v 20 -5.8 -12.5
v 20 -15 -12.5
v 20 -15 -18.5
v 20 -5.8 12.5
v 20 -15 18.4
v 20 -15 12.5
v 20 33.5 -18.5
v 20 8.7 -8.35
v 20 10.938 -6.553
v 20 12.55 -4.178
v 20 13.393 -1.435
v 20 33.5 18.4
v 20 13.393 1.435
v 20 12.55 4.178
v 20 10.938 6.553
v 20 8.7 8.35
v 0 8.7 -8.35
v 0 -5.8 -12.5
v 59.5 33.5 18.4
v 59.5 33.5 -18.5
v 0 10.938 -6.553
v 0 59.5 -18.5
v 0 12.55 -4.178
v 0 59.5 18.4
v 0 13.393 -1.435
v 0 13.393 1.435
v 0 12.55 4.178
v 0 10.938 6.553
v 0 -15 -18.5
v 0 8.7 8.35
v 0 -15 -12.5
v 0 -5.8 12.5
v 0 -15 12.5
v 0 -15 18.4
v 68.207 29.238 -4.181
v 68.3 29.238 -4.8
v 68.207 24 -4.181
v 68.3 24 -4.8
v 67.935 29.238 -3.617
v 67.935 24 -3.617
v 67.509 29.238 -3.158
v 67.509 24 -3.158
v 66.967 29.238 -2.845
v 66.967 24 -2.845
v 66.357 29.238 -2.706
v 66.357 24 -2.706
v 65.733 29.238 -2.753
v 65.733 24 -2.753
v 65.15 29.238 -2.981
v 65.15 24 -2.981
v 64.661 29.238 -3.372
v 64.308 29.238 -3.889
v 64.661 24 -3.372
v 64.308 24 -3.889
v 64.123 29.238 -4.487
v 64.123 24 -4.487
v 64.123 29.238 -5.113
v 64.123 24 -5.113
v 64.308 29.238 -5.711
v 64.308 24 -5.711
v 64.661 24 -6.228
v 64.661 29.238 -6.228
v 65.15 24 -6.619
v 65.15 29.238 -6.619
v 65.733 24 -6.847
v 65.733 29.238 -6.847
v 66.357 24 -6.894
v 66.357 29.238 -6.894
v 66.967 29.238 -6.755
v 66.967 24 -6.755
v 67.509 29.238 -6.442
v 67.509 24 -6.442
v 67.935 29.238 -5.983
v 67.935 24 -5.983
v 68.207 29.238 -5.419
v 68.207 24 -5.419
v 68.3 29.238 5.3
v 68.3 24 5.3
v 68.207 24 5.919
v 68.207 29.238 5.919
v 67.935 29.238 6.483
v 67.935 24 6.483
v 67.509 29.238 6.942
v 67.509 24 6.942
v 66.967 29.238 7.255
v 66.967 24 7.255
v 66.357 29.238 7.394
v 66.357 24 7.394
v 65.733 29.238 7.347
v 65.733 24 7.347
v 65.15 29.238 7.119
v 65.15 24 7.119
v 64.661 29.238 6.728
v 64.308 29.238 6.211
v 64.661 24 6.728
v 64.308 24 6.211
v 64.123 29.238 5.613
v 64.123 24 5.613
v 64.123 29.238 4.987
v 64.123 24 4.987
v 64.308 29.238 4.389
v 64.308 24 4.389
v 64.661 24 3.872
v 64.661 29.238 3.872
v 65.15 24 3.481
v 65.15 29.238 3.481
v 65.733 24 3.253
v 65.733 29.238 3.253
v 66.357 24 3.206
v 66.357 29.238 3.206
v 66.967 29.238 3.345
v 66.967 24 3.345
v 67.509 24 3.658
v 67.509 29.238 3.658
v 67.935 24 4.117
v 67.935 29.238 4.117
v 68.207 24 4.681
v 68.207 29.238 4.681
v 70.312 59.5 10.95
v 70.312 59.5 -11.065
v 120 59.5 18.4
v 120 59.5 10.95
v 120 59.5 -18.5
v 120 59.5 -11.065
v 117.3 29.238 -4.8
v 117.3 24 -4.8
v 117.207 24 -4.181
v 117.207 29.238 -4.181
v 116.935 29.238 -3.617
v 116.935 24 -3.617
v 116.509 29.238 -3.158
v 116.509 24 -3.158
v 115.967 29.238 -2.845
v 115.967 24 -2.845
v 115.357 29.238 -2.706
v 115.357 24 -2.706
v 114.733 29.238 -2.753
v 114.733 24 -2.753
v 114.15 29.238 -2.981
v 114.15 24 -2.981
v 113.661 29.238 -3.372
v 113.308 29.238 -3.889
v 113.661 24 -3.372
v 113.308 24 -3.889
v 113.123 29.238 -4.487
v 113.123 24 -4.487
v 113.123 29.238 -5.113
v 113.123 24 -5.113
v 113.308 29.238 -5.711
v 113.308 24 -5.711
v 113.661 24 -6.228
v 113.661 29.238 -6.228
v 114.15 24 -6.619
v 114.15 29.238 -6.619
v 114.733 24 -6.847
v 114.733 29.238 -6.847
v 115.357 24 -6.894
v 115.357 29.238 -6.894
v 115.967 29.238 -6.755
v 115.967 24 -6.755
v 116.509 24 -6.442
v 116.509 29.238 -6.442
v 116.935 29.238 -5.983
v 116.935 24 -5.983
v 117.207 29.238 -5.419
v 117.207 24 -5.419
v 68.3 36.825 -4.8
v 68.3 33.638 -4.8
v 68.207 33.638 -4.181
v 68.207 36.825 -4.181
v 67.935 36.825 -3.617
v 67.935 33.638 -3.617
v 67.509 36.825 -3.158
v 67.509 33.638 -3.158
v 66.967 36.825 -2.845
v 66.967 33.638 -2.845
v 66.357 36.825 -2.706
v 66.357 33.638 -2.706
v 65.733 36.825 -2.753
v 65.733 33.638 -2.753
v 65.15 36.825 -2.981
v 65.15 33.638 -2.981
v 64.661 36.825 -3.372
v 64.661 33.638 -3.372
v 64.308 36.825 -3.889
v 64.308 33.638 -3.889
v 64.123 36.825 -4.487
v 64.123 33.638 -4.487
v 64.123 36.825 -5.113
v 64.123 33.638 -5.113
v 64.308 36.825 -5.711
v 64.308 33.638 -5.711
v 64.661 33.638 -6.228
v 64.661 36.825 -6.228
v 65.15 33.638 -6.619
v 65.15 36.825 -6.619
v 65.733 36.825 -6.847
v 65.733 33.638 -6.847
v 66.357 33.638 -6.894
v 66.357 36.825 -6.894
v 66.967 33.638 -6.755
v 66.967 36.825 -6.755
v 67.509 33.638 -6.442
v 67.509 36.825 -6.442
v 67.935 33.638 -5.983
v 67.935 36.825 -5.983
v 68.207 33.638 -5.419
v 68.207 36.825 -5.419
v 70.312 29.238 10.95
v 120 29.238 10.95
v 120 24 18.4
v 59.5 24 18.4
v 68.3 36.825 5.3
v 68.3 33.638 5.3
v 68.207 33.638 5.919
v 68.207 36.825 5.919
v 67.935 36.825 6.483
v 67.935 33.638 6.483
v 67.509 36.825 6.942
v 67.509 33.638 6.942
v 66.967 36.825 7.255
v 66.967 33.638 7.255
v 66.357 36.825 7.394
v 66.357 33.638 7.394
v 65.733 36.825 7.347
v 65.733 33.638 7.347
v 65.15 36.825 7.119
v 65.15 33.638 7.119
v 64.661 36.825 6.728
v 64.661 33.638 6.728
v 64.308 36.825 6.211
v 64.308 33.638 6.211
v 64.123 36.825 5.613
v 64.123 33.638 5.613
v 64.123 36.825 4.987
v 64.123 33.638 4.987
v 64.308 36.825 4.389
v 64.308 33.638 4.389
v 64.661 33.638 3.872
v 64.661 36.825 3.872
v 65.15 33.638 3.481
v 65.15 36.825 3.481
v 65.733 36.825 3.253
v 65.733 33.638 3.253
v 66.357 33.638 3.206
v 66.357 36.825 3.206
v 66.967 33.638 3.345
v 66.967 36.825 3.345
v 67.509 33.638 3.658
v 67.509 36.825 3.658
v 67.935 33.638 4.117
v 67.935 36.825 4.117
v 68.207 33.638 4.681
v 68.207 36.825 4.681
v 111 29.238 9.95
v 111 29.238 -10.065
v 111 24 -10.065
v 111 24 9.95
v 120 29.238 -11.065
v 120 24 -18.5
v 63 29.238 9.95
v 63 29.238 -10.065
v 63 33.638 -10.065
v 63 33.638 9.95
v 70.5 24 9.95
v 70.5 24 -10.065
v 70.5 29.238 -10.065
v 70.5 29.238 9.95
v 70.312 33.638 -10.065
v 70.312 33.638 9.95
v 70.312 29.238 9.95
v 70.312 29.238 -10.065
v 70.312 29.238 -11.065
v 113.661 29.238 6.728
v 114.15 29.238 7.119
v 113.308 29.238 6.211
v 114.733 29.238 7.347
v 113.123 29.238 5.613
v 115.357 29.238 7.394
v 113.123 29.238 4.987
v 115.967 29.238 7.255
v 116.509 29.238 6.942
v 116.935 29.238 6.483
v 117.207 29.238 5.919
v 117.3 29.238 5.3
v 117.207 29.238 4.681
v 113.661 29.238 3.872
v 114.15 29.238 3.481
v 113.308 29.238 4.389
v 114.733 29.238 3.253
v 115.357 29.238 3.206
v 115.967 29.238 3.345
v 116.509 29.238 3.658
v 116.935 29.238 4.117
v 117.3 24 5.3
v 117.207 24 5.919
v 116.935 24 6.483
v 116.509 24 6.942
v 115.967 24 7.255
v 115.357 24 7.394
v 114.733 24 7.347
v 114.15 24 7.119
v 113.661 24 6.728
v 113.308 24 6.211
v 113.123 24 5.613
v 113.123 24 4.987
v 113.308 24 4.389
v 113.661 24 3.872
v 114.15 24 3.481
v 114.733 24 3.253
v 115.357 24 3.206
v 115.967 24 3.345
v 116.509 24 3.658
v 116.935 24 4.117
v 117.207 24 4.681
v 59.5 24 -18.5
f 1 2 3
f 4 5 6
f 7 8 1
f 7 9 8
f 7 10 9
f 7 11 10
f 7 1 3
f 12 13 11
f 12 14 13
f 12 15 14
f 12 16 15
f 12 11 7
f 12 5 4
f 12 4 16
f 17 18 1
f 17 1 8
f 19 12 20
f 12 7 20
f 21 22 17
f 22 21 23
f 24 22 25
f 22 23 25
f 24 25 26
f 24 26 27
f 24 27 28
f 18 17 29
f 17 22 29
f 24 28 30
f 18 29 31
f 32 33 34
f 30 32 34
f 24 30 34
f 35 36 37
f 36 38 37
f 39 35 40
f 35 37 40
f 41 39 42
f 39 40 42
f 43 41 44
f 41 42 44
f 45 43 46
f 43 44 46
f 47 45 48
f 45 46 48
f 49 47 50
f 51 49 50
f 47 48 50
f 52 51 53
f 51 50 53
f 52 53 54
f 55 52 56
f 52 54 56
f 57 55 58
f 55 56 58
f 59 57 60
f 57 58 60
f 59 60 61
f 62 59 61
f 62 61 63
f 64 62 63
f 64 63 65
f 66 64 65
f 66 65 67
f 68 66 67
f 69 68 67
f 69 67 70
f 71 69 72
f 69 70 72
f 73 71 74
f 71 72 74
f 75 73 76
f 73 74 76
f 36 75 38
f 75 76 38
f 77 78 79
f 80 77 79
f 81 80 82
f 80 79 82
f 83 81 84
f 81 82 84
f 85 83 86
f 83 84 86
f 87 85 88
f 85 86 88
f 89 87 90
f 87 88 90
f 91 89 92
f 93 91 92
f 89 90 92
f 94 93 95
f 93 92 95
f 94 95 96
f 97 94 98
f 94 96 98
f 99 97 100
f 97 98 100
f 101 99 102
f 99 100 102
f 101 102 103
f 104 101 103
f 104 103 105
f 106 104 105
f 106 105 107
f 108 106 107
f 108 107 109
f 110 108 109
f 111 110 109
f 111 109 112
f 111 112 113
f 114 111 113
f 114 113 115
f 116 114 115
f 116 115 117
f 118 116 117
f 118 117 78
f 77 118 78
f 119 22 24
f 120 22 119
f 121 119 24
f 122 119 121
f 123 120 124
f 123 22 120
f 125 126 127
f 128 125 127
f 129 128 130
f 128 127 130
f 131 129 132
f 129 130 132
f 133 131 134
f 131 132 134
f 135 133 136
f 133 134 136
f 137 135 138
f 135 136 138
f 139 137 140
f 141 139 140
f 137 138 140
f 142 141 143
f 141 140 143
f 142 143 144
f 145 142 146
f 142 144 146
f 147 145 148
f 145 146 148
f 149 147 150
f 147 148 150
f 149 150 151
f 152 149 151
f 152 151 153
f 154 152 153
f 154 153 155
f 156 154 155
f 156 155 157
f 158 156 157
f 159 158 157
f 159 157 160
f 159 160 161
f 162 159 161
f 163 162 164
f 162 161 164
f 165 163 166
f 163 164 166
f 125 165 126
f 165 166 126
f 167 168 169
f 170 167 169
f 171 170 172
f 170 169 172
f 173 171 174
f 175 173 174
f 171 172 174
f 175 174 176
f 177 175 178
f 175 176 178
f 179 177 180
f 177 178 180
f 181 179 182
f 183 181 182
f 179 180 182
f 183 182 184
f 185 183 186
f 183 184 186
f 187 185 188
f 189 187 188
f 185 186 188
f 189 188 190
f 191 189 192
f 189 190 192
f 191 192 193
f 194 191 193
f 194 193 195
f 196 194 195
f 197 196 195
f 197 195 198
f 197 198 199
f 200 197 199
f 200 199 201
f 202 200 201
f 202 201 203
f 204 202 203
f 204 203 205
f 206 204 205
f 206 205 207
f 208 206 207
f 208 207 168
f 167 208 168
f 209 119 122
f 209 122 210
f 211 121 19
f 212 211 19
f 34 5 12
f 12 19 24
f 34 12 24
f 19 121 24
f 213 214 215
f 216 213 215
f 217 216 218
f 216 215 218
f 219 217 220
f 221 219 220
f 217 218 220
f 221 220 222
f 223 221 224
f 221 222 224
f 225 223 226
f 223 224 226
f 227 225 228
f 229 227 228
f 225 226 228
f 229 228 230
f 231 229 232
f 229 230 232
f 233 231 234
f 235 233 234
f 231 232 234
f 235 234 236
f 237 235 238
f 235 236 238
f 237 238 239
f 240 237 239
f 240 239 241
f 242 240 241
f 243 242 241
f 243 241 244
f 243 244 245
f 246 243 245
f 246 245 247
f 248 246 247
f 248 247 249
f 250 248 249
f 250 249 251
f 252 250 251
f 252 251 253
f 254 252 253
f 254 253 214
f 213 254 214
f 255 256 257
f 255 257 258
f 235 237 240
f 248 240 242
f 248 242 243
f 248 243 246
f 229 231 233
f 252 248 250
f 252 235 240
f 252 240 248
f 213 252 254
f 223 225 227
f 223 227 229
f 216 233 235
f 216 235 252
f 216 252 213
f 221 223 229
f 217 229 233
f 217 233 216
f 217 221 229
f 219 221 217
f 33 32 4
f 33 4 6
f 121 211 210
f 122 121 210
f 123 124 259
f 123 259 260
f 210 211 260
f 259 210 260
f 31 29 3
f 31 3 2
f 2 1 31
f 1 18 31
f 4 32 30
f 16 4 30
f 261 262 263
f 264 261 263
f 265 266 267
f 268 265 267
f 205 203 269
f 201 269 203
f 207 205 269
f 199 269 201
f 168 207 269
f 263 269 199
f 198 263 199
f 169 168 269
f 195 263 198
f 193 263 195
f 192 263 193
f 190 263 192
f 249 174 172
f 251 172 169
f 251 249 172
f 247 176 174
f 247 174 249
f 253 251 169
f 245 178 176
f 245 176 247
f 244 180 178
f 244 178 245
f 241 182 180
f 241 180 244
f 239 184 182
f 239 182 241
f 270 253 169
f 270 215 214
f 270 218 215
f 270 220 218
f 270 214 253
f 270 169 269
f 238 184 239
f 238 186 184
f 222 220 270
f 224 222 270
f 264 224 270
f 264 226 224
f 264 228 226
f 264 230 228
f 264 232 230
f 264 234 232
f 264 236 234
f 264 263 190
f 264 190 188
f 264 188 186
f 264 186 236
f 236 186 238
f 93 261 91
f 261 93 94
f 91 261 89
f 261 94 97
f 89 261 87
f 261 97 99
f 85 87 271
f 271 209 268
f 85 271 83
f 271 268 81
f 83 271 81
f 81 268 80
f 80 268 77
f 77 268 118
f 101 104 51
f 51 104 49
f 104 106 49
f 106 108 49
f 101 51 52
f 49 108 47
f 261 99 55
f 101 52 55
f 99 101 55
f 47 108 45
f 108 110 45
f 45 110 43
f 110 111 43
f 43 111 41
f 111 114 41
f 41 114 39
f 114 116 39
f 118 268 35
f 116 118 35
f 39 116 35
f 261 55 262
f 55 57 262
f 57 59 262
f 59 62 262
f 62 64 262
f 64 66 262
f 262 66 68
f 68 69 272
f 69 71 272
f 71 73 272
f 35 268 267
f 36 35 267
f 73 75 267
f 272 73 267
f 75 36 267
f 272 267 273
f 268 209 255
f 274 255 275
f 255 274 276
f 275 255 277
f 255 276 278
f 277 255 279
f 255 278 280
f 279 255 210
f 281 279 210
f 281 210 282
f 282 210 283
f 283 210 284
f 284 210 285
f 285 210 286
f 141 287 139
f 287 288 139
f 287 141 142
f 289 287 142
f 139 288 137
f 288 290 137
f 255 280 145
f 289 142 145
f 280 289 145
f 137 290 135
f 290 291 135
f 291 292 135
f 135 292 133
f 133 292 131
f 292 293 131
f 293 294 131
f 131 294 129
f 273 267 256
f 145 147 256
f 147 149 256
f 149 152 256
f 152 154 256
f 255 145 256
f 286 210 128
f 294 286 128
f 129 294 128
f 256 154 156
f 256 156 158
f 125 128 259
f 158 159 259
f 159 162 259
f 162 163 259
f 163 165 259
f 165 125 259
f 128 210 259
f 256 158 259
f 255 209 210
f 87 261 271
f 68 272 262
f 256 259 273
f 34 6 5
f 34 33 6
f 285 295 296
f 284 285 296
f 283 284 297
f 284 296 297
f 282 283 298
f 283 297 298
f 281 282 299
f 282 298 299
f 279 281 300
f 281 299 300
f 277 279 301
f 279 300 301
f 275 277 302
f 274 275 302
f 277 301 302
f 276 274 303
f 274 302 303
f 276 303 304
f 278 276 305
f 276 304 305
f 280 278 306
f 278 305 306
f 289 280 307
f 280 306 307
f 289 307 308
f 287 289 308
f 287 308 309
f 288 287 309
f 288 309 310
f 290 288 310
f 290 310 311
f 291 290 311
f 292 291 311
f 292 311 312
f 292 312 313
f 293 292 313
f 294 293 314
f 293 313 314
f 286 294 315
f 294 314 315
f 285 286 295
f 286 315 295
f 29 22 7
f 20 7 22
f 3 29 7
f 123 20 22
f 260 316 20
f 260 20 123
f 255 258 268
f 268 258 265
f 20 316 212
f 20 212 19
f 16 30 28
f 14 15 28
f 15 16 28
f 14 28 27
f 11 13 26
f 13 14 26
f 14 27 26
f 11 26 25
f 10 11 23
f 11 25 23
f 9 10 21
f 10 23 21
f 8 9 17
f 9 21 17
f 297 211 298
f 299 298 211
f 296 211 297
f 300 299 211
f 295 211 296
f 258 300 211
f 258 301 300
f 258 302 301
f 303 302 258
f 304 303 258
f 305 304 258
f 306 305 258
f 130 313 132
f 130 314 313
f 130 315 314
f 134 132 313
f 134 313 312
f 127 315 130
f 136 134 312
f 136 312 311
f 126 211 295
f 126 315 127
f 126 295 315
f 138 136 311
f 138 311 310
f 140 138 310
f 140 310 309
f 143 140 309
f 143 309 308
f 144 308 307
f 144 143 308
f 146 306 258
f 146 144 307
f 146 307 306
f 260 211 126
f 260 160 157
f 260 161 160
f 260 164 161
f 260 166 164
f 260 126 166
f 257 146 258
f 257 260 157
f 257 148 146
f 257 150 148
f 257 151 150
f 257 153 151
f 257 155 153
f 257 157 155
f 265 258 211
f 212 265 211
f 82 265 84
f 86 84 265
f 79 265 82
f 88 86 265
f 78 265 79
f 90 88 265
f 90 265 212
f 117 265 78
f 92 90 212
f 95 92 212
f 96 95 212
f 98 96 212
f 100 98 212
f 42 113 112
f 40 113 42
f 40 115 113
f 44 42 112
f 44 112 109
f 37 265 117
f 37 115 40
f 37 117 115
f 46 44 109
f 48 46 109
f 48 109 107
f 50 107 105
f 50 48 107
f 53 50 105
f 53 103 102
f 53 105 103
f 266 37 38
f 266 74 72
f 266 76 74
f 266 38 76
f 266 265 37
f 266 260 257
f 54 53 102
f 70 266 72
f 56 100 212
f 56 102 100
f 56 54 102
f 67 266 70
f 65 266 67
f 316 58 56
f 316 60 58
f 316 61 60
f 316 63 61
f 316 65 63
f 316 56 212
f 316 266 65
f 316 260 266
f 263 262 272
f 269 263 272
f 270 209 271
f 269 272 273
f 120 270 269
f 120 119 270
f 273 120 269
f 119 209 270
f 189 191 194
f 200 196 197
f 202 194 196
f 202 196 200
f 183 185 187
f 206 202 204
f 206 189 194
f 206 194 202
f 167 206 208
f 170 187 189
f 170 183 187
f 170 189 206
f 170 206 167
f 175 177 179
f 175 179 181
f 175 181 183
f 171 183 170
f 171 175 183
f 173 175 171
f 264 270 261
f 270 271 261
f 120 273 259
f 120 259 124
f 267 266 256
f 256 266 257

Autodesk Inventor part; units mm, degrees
ref_plane "YZ Plane" through (0, 0, 0) normal (1, 0, 0) x (0, 1, 0)
ref_plane "XZ Plane" through (0, 0, 0) normal (0, 1, 0) x (-1, 0, 0)
ref_plane "XY Plane" through (0, 0, 0) normal (0, 0, 1) x (1, 0, 0)
sketch "Sketch1" plane through (0, 0, 0) normal (1, 0, 0) x (0, 1, 0)
  line L0 (-5.8, 12.5) -> (-15, 12.5)
  line L1 (-5.8, -12.5) -> (-15, -12.5)
  line L2 (-5.8, 12.5) -> (8.7, 8.35)
  line L3 (-5.8, -12.5) -> (8.7, -8.35)
  arc A0 (8.7, -8.35) -> (8.7, 8.35) centre (3.8372, 0) ccw
  line L4 (-15, 12.5) -> (-15, 18.5)
  line L5 (-15, 18.5) -> (33.5, 18.5)
  line L6 (33.5, 18.5) -> (33.5, -18.5)
  line L7 (33.5, -18.5) -> (-15, -18.5)
  line L8 (-15, -18.5) -> (-15, -12.5)
  point P0 (0, 0)
  point P1 (-10.4, 12.5)
  point P2 (10.8853, -1.4818)
  point P3 (13.5, 0)
  point P4 (33.5, 0)
  dimension "d0" = 9.2
  dimension "d1" = 25
  dimension "d2" = 12.5
  dimension "d5" = 14.5
  dimension "d6" = 14.5
  dimension "d7" = 9.2
  dimension "d8" = 12.5
  dimension "d9" = 15
  dimension "d10" = 15
  dimension "d11" = 4.15
  dimension "d12" = 4.15
  dimension "d13" = 4.8
  dimension "d14" = 6
  dimension "d15" = 6
  dimension "d16" = 37
  dimension "d29" = 20
extrude "Extrusion1" add sketch "Sketch1" along normal blind 20
sketch "Sketch2" plane through (0, 33.5, 18.5) normal (0, 1, 0) x (1, 0, 0)
  line L0 (0, 31) -> (0, 37) projected
  line L1 (0, 37) -> (70.5, 37)
  line L2 (70.5, 37) -> (70.5, 0.0995)
  line L3 (70.5, 0.0995) -> (0, 0.0995)
  line L4 (0, 0.0995) -> (0, 37)
  line L5 (20, 37) -> (20, 0) projected
  point P0 (0, 18.5)
  point P1 (70.5, 18.5498)
  point P2 (0, 31)
  dimension "d19" = 50.5
extrude "Extrusion2" add sketch "Sketch2" along normal blind 10
sketch "Sketch3" plane through (0, 33.5, 18.5) normal (0, -1, 0) x (1, 0, 0)
  line L0 (111, -8.5498) -> (111, -28.5498)
  line L1 (111, -28.5498) -> (70.5, -28.5498)
  line L2 (70.5, -28.5498) -> (70.5, -8.5498)
  line L3 (70.5, -0.0995) -> (70.5, -37) projected
  line L4 (111, -8.5498) -> (120, -8.5498)
  line L5 (120, -8.5498) -> (120, -37)
  line L6 (120, -37) -> (70.5, -37)
  line L7 (70.5, -37) -> (0, -37) projected
  line L8 (70.5, -37) -> (59.5, -37)
  line L9 (59.5, -37) -> (59.5, -8.5498)
  line L10 (59.5, -8.5498) -> (70.5, -8.5498)
  point P0 (0, -18.5)
  point P1 (70.5, -18.5498)
  point P2 (70.5, -18.5498)
  point P3 (111, -18.5498)
  dimension "d22" = 20
  dimension "d23" = 20
  dimension "d24" = 0
  dimension "d25" = 40.5
  dimension "d26" = 9
  dimension "d30" = 11
extrude "Extrusion3" add sketch "Sketch3" along normal blind 9.5 and the other way blind 10
sketch "Sketch4" plane through (0, 43.5, 18.5) normal (0, 1, 0) x (1, 0, 0)
  line L0 (111, 8.5498) -> (120, 8.5498) projected
  line L1 (63, 28.5653) -> (120, 28.5653)
  line L2 (120, 28.5653) -> (120, 8.5498)
  line L3 (120, 8.5498) -> (63, 8.5498)
  line L4 (63, 8.5498) -> (63, 28.5653)
  line L5 (70.5, 0.0995) -> (70.5, 28.5498) projected
  line L6 (111, 28.5498) -> (111, 8.5498) projected
  point P0 (0, 18.5)
  point P1 (70.5, 14.3246)
  dimension "d33" = 7.5
  dimension "d34" = 9
extrude "Extrusion4" cut sketch "Sketch4" against normal blind 14.2625
sketch "Sketch5" plane through (0, 43.5, 18.5) normal (0, 1, 0) x (1, 0, 0)
  line L0 (63, 8.5498) -> (63, 28.5653) projected
  line L1 (63, 8.5498) -> (70.5, 8.5498)
  line L2 (70.5, 8.5498) -> (70.5, -1.0168)
  line L3 (70.5, -1.0168) -> (63, -1.0168)
  line L4 (63, -1.0168) -> (63, 8.5498)
  line L5 (70.5, 0.0995) -> (70.5, 8.5498) projected
  point P0 (0, 18.5)
  dimension "d47" = 0
extrude "Extrusion5" cut sketch "Sketch5" against normal blind 14.2625
sketch "Sketch7" plane through (59.5, 24, 9.9502) normal (0, 0, 1) x (1, 0, 0)
  line L0 (3.5, 5.2375) -> (3.5, 9.5) projected
  line L1 (11, 0) -> (11, 5.2375) projected
  line L2 (3.5, 5.2375) -> (11, 5.2375)
  line L3 (11, 5.2375) -> (11, 0)
  line L4 (11, 0) -> (0, 0)
  line L5 (0, 0) -> (0, 9.5)
  line L6 (0, 9.5) -> (3.5, 9.5)
  line L7 (-39.5, 9.5) -> (3.5, 9.5) projected
  line L8 (3.5, 9.5) -> (3.5, 19.5) projected
  point P0 (-59.5, -24)
  dimension "d42" = 11
  dimension "d43" = 0
  dimension "d44" = 0
extrude "Extrusion7" add sketch "Sketch7" along normal blind 8.45
sketch "Sketch8" plane through (63, 43.5, 18.4005) normal (1, 0, 0) x (0, 0, -1)
  line L0 (28.4658, 0) -> (28.4658, -14.2625) projected
  line L1 (36.9005, 0) -> (0, 0) projected
  line L2 (28.4658, -9.8625) -> (0, -9.8625)
  line L3 (0, -9.8625) -> (0, 0)
  line L4 (0, 0) -> (28.4658, 0)
  line L5 (28.4658, 0) -> (28.4658, -9.8625)
  line L6 (28.4658, -14.2625) -> (8.4502, -14.2625) projected
  line L7 (8.4502, -14.2625) -> (8.4502, -19.5) projected
  line L8 (0, -10) -> (0, 0) projected
  point P0 (18.4005, -43.5)
  dimension "d48" = 4.4
  dimension "d52" = 0
extrude "Extrusion8" add sketch "Sketch8" along normal blind 7.5
sketch "Sketch9" plane through (0, 43.5, 18.5) normal (0, 1, 0) x (1, 0, 0)
  line L0 (59.5, 37) -> (59.5, 0.0998) projected
  line L1 (59.5, 0.0998) -> (59.5, 37)
  line L2 (120, 37) -> (120, 8.5498) projected
  line L3 (59.5, 37) -> (120, 37)
  line L4 (70.5, 28.5653) -> (120, 28.5653) projected
  line L5 (120, 37) -> (120, 28.5653)
  line L6 (120, 28.5653) -> (70.5, 28.5653)
  line L7 (0, 0.0995) -> (70.5, 0.0995) projected
  line L8 (70.5, 28.5653) -> (70.5, 0.0995)
  line L9 (70.5, 0.0995) -> (59.5, 0.0998)
  point P0 (0, 18.5)
extrude "Extrusion9" add sketch "Sketch9" along normal blind 16
sketch "Sketch10" plane through (0, 43.5, 18.5) normal (0, 1, 0) x (1, 0, 0)
  line L0 (59.5, 0.0998) -> (59.5, 37) projected
  line L1 (0, 0.0995) -> (70.5, 0.0995) projected
  line L2 (59.5, 37) -> (0, 37)
  line L3 (0, 37) -> (0, 0.0995)
  line L4 (0, 0.0995) -> (59.5, 0.0995)
  line L5 (59.5, 0.0995) -> (59.5, 37)
  point P0 (0, 18.5)
  point P1 (59.5, 0.0995)
extrude "Extrusion10" add sketch "Sketch10" along normal blind 16
sketch "Sketch12" plane through (0, 59.5, 18.5) normal (0, 1, 0) x (1, 0, 0)
  line L0 (70.5, 28.5498) -> (70.5, 0.0998) projected
  line L1 (70.5, 0.0998) -> (0, 0.0998)
  line L2 (0, 0.0998) -> (0, -16.6848)
  line L3 (0, -16.6848) -> (70.5, -16.6848)
  line L4 (70.5, -16.6848) -> (70.5, 0.0998)
  point P0 (0, 18.5)
extrude "Extrusion11" cut sketch "Sketch12" against normal blind 76.325
sketch "Sketch13" plane through (0, 29.2375, 18.5) normal (0, 1, 0) x (1, 0, 0)
  line L0 (111, 8.5498) -> (111, 28.5498) projected
  line L1 (70.5, 0.0998) -> (70.5, 28.5653) projected
  line L2 (111, 28.5498) -> (70.5, 28.5498)
  line L3 (70.5, 28.5498) -> (70.5, 28.5653)
  line L4 (70.5, 28.5653) -> (111, 28.5653)
  line L5 (111, 28.5653) -> (111, 28.5498)
  point P0 (0, 18.5)
extrude "Extrusion12" cut sketch "Sketch13" against normal blind 76.325
sketch "Sketch14" plane through (0, 24, 18.5) normal (0, -1, 0) x (1, 0, 0)
  circle A0 centre (115.2, -23.3) radius 2.1
  circle A1 centre (115.2, -13.2) radius 2.1
  line L0 (111, -8.5498) -> (111, -28.5653) projected
  line L1 (20, -10.15) -> (20, -26.85) projected
  point P0 (0, -18.5)
  point P1 (20, -18.5)
  dimension "d61" = 4.2
  dimension "d62" = 4.2
  dimension "d63" = 10.1
  dimension "d64" = 4.2
  dimension "d65" = 0
  dimension "d66" = 4.8
extrude "Extrusion13" cut sketch "Sketch14" against normal blind 12.825
pattern_linear "Rectangular Pattern1" count 2 spacing 49 along (-1, 0, 0) of "Extrusion13"
sketch "Sketch15" plane through (0, 24, 18.5) normal (0, -1, 0) x (1, 0, 0)
  line L0 (70.5, -0.0998) -> (70.5, -28.5653) projected
  line L1 (70.5, -0.0998) -> (120, -0.0998)
  line L2 (120, -0.0998) -> (120, -8.5498)
  line L3 (120, -8.5498) -> (111, -8.5498) projected
  line L4 (120, -8.5498) -> (111, -8.5498)
  line L5 (111, -8.5498) -> (68.7571, -8.5498)
  line L6 (68.7571, -8.5498) -> (59.5, -8.5498)
  line L7 (59.5, -37) -> (59.5, -0.0998) projected
  line L8 (59.5, -0.0998) -> (59.5, -8.5498)
  line L9 (59.5, -0.0998) -> (70.5, -0.0998)
  point P0 (0, -18.5)
extrude "Extrusion14" add sketch "Sketch15" against normal blind 35.5
sketch "Sketch16" plane through (120, 24, 18.4002) normal (1, 0, 0) x (0, 0, -1)
  line L0 (7.45, 5.2375) -> (29.4655, 5.2375)
  line L1 (29.4655, 5.2375) -> (29.4655, 38.0522)
  line L2 (29.4655, 38.0522) -> (7.45, 38.0522)
  line L3 (7.45, 38.0522) -> (7.45, 5.2375)
  line L4 (28.4655, 5.2375) -> (8.45, 5.2375) projected
  line L5 (8.45, 5.2375) -> (8.45, 35.5) projected
  line L6 (28.4655, 35.5) -> (28.4655, 5.2375) projected
  point P0 (18.4002, -24)
  dimension "d74" = 0
  dimension "d75" = 1
  dimension "d76" = 1
extrude "Extrusion15" cut sketch "Sketch16" against normal blind 49.6875
properties part number "Holder2"
